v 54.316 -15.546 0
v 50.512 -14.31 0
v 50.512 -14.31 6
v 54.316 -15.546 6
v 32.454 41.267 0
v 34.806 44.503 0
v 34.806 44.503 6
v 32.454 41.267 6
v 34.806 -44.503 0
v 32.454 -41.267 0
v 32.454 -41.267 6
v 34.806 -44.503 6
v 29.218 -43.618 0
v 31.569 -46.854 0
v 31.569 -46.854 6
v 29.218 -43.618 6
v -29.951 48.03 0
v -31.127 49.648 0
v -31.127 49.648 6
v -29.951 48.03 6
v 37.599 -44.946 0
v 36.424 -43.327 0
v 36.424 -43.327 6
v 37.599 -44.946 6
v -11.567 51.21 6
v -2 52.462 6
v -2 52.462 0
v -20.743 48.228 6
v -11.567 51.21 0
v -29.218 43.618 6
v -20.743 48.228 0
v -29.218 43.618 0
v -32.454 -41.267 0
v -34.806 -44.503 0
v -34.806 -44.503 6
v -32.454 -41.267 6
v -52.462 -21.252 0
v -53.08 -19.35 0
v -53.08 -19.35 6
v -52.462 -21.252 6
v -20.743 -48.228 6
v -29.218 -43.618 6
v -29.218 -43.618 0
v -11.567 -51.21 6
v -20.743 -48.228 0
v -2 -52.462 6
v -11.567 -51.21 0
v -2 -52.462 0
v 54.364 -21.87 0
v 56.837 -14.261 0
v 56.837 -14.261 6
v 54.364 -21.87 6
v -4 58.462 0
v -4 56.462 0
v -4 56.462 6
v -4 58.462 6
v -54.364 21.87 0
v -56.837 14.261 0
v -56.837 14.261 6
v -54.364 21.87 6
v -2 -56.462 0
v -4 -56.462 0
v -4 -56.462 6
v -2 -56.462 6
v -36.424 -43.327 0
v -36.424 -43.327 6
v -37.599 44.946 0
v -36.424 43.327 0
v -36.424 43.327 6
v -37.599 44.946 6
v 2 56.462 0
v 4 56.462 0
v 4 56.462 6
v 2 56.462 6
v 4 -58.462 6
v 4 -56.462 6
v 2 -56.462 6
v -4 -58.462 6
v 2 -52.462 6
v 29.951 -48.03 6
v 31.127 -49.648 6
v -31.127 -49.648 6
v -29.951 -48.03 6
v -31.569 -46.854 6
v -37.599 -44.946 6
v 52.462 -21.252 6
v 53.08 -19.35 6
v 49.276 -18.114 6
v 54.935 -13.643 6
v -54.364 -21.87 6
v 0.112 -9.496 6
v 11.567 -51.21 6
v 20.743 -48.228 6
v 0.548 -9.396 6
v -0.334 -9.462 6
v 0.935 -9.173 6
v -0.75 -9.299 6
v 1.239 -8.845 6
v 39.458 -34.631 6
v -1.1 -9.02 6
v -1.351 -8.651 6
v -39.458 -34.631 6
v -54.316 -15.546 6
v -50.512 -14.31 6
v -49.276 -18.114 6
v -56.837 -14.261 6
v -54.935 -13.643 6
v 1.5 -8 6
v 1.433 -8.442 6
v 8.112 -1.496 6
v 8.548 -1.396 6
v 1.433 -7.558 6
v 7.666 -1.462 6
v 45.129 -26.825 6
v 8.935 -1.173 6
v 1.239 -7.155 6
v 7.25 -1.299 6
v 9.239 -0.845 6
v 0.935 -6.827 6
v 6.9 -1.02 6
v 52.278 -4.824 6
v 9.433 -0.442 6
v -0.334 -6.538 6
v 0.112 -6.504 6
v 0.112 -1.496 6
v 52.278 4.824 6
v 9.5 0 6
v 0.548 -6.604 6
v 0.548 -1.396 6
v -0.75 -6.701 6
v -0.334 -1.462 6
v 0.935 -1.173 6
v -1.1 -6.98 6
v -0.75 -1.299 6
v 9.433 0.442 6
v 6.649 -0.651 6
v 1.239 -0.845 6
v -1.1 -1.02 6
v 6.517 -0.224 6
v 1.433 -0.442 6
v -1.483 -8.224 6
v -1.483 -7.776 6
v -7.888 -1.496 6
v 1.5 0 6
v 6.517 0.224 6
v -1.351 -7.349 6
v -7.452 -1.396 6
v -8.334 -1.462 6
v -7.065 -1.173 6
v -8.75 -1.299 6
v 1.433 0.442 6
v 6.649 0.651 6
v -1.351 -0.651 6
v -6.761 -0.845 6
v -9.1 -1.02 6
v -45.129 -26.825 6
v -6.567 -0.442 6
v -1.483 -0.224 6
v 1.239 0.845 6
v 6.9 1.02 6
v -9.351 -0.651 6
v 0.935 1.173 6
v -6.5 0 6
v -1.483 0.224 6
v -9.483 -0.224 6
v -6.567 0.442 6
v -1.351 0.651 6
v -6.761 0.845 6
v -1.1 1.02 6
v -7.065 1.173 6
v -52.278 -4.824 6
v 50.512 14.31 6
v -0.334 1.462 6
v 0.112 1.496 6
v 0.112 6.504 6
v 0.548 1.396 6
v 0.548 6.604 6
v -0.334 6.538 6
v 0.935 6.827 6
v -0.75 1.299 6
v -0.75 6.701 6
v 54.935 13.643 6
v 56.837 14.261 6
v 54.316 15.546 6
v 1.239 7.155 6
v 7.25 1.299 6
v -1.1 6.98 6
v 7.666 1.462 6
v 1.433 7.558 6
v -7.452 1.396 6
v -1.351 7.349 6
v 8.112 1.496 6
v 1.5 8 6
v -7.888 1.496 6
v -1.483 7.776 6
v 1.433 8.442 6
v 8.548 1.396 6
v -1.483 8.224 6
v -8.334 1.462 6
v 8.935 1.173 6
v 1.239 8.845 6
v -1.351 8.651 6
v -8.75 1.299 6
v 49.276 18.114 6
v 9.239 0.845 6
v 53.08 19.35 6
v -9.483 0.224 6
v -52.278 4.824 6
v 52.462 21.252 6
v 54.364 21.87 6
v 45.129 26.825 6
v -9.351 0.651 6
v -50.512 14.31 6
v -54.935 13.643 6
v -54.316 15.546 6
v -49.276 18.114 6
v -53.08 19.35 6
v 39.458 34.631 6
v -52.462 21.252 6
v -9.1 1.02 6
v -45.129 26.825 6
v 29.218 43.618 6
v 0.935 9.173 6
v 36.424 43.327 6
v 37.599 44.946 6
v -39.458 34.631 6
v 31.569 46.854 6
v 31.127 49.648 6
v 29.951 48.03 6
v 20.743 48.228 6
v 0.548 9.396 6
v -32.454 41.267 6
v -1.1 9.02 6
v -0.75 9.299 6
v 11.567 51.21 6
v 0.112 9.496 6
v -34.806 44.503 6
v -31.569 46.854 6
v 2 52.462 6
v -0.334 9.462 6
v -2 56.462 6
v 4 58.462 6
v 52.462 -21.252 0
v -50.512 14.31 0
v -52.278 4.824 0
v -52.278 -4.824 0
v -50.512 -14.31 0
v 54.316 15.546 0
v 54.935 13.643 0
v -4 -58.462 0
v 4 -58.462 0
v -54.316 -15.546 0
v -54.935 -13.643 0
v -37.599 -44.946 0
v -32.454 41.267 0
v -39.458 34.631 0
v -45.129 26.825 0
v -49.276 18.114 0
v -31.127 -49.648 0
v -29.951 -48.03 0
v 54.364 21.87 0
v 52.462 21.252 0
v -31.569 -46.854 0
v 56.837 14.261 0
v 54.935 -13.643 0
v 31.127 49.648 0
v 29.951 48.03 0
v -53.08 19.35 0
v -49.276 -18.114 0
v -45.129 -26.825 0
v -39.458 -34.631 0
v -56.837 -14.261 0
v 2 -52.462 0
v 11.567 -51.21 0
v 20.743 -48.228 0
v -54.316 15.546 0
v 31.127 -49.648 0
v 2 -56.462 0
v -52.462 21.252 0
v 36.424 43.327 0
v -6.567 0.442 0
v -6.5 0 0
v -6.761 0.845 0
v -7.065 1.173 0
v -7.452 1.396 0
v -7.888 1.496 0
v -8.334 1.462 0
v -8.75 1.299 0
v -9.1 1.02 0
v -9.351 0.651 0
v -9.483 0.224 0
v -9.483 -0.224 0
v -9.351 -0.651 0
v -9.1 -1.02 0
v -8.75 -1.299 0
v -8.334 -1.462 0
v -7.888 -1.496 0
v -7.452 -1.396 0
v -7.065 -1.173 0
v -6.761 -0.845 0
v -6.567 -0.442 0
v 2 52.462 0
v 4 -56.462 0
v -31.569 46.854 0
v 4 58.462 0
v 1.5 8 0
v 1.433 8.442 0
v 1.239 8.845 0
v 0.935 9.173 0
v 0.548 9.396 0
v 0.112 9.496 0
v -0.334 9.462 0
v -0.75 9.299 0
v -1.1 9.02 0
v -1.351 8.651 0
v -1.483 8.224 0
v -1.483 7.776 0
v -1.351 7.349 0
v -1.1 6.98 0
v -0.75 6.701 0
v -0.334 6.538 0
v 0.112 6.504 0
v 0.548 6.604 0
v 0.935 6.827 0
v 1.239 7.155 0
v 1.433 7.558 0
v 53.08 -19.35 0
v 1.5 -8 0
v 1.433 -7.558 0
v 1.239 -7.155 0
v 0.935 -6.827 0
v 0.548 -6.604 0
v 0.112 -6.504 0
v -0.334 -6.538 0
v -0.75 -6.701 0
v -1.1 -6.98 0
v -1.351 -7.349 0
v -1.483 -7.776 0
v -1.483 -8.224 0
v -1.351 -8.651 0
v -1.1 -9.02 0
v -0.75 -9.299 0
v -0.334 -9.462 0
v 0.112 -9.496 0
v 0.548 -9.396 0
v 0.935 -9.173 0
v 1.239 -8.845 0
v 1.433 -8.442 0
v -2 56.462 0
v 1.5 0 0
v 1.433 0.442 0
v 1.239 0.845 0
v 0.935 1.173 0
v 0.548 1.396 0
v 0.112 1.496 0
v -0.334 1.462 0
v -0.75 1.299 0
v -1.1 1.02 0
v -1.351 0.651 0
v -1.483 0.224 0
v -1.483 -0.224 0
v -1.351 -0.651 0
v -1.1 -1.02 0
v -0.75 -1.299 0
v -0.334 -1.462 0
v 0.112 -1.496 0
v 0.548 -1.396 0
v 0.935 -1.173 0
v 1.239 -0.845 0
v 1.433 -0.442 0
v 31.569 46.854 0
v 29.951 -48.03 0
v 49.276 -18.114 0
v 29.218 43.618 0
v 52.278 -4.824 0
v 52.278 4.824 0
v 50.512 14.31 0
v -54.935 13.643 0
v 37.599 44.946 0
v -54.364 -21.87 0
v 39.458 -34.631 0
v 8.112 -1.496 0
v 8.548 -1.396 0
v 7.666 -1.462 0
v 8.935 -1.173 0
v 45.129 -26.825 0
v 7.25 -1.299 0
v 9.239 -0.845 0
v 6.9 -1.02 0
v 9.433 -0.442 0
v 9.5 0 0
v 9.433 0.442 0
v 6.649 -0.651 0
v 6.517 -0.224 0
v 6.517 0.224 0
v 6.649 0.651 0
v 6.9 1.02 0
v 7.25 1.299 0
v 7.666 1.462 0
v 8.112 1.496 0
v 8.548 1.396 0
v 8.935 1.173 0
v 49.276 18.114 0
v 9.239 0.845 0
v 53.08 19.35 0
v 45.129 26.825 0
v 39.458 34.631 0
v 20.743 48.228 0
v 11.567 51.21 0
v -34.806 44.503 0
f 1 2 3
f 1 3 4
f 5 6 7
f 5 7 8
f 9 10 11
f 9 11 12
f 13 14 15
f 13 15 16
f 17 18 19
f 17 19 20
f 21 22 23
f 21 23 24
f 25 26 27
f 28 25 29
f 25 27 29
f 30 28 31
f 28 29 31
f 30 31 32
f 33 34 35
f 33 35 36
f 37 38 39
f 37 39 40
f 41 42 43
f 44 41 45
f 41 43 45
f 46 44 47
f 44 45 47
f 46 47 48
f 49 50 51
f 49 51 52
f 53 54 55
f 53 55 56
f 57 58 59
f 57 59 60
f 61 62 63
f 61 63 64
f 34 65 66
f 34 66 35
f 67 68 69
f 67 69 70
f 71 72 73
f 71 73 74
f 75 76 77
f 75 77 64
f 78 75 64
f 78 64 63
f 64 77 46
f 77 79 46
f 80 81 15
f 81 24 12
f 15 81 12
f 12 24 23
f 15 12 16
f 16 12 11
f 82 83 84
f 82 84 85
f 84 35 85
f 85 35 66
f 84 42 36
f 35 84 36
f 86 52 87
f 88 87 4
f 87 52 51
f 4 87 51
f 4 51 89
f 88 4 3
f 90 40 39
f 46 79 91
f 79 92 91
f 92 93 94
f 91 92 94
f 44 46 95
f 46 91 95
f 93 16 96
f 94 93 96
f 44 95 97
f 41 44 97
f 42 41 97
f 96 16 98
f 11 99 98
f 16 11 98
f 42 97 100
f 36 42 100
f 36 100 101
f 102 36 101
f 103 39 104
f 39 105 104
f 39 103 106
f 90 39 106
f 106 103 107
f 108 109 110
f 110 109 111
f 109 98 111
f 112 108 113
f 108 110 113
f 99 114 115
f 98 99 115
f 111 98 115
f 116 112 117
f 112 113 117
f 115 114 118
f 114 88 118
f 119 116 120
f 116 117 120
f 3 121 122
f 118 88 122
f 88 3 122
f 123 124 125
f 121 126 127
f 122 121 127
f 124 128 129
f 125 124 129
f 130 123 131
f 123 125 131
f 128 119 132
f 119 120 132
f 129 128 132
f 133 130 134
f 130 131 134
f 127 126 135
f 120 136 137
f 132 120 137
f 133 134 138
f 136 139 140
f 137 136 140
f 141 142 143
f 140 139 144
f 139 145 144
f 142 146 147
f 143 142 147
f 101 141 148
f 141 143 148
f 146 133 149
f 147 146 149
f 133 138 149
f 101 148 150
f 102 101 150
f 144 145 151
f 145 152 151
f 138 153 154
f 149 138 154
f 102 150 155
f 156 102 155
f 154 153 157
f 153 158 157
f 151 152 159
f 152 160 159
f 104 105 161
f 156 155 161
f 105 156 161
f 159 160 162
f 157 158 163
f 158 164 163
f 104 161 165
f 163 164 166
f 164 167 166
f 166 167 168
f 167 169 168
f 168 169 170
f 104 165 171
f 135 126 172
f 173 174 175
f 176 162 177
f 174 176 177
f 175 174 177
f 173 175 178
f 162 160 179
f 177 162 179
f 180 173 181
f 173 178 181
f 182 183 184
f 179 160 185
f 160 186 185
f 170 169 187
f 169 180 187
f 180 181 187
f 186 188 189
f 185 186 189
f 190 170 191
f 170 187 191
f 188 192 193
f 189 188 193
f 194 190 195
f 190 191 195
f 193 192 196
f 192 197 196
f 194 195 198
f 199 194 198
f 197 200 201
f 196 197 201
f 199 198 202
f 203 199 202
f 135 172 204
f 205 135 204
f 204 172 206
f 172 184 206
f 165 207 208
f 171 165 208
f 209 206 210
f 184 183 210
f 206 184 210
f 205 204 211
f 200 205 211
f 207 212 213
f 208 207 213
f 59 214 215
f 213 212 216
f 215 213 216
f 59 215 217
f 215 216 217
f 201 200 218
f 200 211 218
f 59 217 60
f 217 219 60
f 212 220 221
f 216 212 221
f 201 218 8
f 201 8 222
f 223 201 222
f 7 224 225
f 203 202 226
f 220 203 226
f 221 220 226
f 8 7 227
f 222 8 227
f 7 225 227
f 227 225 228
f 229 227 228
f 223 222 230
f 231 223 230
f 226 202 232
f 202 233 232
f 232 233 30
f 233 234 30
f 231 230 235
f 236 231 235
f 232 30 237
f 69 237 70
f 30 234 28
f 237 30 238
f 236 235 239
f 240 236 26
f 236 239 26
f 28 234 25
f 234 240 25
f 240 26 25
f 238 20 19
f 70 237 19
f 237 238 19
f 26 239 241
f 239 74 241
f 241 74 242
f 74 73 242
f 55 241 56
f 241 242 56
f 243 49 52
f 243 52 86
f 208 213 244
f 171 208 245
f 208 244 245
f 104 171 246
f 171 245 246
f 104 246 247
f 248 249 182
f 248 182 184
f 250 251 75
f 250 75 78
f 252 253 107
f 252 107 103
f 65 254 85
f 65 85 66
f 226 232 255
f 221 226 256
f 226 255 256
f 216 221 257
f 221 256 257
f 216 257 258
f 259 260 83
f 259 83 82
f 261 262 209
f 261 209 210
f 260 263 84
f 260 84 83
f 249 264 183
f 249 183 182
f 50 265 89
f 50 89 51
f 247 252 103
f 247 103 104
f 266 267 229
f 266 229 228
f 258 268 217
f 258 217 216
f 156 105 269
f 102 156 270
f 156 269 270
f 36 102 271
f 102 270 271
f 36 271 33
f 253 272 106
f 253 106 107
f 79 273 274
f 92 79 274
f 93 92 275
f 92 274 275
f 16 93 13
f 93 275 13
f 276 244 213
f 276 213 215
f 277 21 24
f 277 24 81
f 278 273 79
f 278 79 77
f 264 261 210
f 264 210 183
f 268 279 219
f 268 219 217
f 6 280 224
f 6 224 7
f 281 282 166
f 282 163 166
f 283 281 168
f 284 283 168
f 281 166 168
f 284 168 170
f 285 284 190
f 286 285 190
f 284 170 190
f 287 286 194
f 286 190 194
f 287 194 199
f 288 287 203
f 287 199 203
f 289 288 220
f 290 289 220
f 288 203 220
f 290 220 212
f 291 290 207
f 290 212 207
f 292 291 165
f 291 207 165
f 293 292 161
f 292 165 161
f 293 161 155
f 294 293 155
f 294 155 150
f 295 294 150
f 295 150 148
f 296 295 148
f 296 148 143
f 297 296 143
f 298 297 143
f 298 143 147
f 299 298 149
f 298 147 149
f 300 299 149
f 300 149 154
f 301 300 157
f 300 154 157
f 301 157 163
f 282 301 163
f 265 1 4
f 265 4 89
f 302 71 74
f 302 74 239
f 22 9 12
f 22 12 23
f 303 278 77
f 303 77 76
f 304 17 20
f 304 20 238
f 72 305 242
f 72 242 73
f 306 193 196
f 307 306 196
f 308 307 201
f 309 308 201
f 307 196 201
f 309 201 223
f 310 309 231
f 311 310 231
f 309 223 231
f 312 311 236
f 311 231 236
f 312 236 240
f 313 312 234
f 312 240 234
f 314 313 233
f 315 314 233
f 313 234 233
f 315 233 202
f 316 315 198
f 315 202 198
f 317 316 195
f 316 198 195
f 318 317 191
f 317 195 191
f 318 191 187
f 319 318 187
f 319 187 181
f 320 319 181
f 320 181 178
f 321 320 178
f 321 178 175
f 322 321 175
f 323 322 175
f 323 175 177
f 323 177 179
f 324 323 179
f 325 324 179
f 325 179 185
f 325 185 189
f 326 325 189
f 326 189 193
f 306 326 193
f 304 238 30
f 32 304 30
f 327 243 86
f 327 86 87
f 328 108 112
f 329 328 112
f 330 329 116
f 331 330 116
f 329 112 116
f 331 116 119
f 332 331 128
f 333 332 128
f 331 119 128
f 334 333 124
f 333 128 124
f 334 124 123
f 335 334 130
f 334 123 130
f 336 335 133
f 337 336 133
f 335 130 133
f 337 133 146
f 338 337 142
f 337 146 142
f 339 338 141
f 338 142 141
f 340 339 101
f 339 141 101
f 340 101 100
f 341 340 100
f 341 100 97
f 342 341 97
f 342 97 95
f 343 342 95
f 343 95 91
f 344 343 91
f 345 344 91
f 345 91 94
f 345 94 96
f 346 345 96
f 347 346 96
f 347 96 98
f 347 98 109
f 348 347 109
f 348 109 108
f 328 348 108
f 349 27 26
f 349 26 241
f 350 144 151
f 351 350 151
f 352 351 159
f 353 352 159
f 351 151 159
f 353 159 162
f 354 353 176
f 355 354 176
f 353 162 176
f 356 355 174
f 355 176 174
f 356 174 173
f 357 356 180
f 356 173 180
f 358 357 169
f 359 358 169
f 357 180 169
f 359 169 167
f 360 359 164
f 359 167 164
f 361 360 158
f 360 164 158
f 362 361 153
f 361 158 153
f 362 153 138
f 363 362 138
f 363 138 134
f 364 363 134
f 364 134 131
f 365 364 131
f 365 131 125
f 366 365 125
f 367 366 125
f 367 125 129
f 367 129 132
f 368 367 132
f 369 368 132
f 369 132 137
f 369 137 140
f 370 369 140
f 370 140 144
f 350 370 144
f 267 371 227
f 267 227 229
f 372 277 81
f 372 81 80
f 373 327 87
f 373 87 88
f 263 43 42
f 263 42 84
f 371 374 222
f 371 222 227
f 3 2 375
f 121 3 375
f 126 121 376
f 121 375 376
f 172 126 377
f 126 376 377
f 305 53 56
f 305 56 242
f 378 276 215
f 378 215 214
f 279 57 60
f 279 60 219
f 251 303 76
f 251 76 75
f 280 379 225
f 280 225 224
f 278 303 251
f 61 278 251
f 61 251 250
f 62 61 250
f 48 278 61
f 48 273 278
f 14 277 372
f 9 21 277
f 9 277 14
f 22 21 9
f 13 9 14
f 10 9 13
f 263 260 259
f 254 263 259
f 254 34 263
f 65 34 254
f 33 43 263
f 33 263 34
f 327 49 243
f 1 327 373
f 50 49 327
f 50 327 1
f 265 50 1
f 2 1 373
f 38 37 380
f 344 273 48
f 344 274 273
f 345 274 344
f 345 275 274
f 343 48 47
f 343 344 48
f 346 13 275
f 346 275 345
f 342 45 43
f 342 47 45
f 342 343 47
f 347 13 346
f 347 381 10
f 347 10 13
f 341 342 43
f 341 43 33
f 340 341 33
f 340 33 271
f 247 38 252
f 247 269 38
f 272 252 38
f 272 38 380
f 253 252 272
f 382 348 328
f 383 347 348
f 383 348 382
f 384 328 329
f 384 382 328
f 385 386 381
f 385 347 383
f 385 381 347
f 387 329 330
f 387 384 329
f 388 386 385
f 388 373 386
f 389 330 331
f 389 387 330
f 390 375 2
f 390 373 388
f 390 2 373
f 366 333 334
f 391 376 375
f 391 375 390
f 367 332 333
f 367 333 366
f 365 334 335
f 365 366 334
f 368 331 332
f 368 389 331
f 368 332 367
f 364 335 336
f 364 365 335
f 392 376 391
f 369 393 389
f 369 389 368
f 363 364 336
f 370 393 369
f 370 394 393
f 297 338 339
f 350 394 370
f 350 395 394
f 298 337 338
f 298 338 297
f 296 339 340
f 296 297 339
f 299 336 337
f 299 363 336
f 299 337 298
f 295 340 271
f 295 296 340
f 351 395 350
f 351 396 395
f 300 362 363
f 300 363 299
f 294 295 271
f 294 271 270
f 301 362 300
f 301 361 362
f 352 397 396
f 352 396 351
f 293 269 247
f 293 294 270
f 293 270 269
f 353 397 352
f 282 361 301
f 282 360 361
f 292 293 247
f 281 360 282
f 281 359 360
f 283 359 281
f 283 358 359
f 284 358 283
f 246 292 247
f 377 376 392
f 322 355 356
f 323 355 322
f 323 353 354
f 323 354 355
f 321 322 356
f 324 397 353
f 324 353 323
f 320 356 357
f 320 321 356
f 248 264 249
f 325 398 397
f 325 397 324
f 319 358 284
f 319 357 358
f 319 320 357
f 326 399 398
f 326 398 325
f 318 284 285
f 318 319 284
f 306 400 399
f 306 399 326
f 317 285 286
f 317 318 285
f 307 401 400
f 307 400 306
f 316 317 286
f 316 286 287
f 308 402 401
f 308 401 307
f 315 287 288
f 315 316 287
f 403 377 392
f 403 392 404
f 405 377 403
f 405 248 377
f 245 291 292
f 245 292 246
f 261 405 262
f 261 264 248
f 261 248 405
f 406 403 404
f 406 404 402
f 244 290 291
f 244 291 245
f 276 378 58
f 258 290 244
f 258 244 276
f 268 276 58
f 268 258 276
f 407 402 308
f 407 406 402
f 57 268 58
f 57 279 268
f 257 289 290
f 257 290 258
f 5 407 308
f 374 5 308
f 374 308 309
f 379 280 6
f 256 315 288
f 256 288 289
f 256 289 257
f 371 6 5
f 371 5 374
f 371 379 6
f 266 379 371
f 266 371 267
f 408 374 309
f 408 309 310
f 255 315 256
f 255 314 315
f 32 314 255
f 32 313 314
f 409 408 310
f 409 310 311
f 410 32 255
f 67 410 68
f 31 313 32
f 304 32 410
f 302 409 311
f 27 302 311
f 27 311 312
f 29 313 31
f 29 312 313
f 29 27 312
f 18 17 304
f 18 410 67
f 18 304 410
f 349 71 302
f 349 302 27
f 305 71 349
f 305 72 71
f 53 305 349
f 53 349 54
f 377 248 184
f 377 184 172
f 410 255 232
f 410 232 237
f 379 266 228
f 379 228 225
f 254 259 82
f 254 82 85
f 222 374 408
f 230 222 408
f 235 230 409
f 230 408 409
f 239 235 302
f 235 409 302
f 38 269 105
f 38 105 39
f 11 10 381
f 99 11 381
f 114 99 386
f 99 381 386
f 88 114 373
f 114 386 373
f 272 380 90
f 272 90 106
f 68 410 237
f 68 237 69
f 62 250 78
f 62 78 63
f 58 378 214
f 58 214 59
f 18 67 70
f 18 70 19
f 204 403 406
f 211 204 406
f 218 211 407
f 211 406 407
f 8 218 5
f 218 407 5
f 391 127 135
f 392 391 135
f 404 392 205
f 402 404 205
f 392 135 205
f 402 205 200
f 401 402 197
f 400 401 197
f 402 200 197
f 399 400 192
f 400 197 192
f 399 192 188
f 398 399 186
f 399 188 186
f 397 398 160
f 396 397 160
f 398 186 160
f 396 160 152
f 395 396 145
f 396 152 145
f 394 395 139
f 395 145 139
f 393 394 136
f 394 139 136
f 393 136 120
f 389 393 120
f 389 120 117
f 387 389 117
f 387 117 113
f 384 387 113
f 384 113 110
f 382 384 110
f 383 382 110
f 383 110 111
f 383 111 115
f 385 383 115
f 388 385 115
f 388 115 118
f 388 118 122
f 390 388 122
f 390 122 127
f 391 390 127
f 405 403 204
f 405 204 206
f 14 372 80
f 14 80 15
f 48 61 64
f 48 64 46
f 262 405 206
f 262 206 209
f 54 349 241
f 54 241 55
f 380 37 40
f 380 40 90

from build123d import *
from build123d.topology import SkipClean

# Parameters (mm, degrees)
SKETCH1_R           = 52.5
BOSS_EXTRUDE1_DEPTH = 2
BOSS_EXTRUDE2_DEPTH = 6
CIRPATTERN1_COUNT   = 10
SKETCH4_R           = 1.5
CUT_EXTRUDE2_DEPTH  = 10


with BuildPart() as part:
    # Sketch1 → Boss-Extrude1 (new body)
    with BuildSketch(Plane.XY):
        Circle(SKETCH1_R)
    extrude(amount=BOSS_EXTRUDE1_DEPTH)

    # Sketch6 → Boss-Extrude2 (add)
    with SkipClean():  # the faces are left unmerged after this step: merging them gives an invalid solid
        with BuildSketch(Plane.XY):
            with BuildLine():
                Line((-2, 52.46189093), (-2, 56.46189093))
                Line((-2, 56.46189093), (-4, 56.46189093))
                Line((-4, 56.46189093), (-4, 58.46189093))
                Line((-4, 58.46189093), (4, 58.46189093))
                Line((4, 58.46189093), (4, 56.46189093))
                Line((4, 56.46189093), (2, 56.46189093))
                Line((2, 56.46189093), (2, 52.46189093))
                ThreePointArc((2, 52.46189093), (0, -52.5), (-2, 52.46189093))
            make_face()
        boss_extrude2 = extrude(amount=BOSS_EXTRUDE2_DEPTH)

    # CirPattern1: Boss-Extrude2 ×10 about axis
    cirpattern1_axis = Axis((0, 0, 0), (0, 0, 1))
    for i in range(1, CIRPATTERN1_COUNT):
        add(boss_extrude2.rotate(cirpattern1_axis, i * 360 / CIRPATTERN1_COUNT))

    # Sketch4 → Cut-Extrude2 (cut, symmetric)
    with BuildSketch(Plane.XY.offset(6)):
        with Locations((0, 8)):
            Circle(SKETCH4_R)
        Circle(SKETCH4_R)
        with Locations((8, 0)):
            Circle(SKETCH4_R)
        with Locations((0, -8)):
            Circle(SKETCH4_R)
        with Locations((-8, 0)):
            Circle(SKETCH4_R)
    extrude(amount=CUT_EXTRUDE2_DEPTH, both=True, mode=Mode.SUBTRACT)


solid = part.part
